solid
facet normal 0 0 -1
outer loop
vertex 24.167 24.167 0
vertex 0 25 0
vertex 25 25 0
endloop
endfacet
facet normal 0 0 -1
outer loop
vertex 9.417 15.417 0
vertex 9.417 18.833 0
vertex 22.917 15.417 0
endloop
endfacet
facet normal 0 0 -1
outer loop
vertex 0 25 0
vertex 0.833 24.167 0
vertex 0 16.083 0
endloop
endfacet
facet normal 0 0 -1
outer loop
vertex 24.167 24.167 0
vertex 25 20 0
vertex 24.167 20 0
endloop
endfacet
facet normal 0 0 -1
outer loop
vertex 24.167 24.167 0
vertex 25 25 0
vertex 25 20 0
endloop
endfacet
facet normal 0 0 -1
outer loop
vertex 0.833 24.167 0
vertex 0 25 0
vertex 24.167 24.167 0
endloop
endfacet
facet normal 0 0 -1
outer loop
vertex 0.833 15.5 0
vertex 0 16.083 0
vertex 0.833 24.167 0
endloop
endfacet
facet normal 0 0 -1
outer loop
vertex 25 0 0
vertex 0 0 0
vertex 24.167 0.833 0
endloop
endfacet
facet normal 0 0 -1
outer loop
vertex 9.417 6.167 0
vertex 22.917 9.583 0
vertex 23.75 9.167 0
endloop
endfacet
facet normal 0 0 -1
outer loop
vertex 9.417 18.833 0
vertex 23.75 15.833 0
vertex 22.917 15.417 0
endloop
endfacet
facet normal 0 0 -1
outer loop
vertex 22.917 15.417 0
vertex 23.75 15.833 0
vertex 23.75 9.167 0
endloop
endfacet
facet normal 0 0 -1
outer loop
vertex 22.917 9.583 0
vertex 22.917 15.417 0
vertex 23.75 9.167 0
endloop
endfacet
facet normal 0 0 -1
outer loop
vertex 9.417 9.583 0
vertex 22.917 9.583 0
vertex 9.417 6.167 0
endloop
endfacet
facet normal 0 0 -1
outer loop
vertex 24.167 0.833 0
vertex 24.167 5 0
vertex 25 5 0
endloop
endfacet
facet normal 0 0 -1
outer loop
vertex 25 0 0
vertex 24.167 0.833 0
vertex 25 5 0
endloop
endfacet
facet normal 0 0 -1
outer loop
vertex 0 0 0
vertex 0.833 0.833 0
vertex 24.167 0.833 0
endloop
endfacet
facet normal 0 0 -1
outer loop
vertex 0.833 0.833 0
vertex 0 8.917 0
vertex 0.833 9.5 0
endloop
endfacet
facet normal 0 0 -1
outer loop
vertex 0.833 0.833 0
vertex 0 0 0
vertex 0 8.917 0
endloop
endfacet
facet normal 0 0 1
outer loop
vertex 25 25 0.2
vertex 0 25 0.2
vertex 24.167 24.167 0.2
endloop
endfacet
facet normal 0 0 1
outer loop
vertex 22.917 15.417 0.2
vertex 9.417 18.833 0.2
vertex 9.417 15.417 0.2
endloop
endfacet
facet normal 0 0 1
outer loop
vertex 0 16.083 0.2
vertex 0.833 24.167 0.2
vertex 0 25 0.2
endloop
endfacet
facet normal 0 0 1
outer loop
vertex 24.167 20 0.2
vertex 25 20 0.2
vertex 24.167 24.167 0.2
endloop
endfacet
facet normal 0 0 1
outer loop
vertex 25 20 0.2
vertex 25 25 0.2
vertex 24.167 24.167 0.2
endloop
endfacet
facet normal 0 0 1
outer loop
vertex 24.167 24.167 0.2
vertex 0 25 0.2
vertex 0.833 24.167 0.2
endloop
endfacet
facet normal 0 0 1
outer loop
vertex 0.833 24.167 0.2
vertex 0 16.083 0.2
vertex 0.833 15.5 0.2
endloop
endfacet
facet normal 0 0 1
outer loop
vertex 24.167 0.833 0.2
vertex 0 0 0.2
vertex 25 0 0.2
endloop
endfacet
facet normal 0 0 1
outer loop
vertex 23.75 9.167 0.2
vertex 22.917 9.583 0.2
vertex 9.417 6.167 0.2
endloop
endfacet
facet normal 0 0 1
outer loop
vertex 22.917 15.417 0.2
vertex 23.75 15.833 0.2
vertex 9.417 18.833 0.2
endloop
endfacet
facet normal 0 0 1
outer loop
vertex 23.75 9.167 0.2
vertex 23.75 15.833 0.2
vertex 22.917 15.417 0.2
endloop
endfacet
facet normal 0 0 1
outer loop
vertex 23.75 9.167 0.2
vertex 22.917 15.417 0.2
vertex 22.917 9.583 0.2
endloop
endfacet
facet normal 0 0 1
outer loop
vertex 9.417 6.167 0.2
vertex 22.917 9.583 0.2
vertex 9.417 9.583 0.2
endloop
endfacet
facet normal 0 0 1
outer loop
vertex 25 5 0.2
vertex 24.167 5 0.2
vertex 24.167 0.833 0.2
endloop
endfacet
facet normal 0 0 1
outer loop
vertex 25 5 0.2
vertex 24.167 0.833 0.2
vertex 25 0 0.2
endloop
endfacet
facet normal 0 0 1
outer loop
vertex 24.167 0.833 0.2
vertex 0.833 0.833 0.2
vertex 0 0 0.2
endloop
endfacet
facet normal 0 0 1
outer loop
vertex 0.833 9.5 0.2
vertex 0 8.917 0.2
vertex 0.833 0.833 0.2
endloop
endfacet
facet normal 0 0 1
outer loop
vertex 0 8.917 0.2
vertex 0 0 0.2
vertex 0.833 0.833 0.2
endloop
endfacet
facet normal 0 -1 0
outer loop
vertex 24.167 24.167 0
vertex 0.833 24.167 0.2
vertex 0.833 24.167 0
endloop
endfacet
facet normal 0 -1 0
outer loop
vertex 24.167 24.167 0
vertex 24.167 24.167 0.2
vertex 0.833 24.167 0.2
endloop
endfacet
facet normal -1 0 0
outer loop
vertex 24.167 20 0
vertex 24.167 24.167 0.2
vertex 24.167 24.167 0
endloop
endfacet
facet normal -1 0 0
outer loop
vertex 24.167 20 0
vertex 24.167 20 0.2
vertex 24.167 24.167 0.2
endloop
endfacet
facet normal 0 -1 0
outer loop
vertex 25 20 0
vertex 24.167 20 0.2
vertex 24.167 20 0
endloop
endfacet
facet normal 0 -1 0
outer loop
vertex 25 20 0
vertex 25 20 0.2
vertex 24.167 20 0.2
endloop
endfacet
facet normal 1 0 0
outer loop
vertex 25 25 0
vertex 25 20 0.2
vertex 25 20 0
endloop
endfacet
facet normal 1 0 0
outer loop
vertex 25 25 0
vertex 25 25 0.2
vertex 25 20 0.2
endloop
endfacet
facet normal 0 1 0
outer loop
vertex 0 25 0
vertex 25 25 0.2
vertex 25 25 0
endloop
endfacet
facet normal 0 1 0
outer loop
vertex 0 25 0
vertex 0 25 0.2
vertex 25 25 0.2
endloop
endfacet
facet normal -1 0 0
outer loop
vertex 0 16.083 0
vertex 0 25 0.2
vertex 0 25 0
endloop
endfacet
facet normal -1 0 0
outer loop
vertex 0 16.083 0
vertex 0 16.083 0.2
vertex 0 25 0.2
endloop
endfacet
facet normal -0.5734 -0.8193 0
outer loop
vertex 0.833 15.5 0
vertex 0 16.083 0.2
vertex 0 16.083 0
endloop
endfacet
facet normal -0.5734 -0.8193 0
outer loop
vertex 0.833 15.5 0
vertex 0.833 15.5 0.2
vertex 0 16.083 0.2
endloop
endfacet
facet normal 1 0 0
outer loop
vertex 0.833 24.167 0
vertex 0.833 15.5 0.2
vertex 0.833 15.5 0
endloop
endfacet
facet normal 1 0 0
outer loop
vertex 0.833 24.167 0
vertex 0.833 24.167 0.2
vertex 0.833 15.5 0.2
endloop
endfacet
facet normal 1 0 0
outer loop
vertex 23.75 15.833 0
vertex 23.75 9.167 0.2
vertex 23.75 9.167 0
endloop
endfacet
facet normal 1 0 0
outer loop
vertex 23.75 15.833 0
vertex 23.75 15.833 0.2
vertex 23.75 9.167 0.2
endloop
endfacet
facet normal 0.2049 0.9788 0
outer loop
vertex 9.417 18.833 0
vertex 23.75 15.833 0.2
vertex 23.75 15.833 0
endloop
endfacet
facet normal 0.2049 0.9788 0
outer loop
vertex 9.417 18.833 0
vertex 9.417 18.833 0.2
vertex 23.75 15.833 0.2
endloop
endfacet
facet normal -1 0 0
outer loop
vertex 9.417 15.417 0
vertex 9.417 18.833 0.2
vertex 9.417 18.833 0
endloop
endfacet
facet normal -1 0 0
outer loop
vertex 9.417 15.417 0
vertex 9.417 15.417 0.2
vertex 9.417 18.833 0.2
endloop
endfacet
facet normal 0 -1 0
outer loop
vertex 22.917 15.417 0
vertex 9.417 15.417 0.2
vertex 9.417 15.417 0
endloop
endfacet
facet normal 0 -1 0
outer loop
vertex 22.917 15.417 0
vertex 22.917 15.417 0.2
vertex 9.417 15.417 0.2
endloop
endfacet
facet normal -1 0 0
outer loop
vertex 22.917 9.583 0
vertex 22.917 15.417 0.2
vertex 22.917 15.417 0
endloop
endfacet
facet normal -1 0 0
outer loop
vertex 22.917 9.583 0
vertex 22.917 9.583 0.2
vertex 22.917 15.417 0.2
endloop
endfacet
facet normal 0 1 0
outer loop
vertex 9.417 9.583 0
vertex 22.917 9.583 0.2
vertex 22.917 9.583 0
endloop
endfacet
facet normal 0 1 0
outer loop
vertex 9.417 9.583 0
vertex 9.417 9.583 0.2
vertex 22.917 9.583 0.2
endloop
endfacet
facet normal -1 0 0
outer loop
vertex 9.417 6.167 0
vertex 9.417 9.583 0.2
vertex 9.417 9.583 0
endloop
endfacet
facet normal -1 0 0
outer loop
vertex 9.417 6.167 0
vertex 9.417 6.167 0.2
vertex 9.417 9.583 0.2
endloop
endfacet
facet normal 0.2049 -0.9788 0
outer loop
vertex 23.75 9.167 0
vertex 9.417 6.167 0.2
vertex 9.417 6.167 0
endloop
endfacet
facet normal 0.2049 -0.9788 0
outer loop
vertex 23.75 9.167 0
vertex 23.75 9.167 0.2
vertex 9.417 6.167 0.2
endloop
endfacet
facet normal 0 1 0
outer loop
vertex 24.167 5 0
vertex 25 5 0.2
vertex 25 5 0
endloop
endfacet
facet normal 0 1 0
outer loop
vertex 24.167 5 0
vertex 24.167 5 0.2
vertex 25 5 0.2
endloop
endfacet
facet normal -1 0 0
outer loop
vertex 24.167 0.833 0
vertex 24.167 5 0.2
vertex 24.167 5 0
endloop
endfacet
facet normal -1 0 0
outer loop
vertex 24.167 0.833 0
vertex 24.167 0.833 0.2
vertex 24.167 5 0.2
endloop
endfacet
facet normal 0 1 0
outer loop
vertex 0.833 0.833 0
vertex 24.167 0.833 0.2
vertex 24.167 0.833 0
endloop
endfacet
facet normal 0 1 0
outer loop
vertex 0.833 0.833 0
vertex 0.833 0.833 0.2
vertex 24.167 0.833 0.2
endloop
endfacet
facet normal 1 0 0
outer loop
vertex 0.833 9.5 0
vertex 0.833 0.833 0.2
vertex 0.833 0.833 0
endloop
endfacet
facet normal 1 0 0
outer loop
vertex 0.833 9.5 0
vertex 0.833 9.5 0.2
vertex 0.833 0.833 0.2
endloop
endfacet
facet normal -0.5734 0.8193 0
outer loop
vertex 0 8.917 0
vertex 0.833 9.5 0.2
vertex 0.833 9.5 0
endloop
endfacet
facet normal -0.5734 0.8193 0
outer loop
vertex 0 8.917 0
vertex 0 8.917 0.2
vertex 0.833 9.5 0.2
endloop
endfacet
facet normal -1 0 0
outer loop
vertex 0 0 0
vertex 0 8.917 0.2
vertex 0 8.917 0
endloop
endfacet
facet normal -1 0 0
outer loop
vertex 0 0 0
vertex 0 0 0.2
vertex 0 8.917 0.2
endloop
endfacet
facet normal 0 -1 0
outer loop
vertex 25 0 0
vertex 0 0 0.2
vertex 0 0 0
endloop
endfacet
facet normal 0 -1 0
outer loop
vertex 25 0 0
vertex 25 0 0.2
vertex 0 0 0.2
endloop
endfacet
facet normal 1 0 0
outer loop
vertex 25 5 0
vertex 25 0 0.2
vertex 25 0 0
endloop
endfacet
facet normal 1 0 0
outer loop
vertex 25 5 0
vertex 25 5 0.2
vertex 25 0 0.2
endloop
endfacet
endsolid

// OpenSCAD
/*
Script Name: EmSCAD-Logo
Description: Generate the em-sea logo at scale.
Repository: https://github.com/em-sea/EmSCAD/
Copyright (C) 2026 em-sea
SPDX-License-Identifier: GPL-3.0-or-later
*/

/* [Logo Size in mm] */
width = 25; // 0.1
height = 0.2; // 0.1

/* [Hidden] */
$fn = 60;
EPSILON = 0.02;

length = width;

module EMCLogo(w, l, h) {
    linear_extrude(height = h) {
        scale([w / 300, l / 300]) {
            polygon([[0, 300], [0, 193], [10, 186], [10, 290], [290, 290], [290, 240], [300, 240], [300, 300]]);
            polygon([[113, 226], [285, 190], [285, 110], [113, 74], [113, 115], [275, 115], [275, 185], [113, 185]]);
            polygon([[0, 0], [0, 107], [10, 114], [10, 10], [290, 10], [290, 60], [300, 60], [300, 0]]);
        }
    }
}

// Do The Thing
EMCLogo(width, length, height);
